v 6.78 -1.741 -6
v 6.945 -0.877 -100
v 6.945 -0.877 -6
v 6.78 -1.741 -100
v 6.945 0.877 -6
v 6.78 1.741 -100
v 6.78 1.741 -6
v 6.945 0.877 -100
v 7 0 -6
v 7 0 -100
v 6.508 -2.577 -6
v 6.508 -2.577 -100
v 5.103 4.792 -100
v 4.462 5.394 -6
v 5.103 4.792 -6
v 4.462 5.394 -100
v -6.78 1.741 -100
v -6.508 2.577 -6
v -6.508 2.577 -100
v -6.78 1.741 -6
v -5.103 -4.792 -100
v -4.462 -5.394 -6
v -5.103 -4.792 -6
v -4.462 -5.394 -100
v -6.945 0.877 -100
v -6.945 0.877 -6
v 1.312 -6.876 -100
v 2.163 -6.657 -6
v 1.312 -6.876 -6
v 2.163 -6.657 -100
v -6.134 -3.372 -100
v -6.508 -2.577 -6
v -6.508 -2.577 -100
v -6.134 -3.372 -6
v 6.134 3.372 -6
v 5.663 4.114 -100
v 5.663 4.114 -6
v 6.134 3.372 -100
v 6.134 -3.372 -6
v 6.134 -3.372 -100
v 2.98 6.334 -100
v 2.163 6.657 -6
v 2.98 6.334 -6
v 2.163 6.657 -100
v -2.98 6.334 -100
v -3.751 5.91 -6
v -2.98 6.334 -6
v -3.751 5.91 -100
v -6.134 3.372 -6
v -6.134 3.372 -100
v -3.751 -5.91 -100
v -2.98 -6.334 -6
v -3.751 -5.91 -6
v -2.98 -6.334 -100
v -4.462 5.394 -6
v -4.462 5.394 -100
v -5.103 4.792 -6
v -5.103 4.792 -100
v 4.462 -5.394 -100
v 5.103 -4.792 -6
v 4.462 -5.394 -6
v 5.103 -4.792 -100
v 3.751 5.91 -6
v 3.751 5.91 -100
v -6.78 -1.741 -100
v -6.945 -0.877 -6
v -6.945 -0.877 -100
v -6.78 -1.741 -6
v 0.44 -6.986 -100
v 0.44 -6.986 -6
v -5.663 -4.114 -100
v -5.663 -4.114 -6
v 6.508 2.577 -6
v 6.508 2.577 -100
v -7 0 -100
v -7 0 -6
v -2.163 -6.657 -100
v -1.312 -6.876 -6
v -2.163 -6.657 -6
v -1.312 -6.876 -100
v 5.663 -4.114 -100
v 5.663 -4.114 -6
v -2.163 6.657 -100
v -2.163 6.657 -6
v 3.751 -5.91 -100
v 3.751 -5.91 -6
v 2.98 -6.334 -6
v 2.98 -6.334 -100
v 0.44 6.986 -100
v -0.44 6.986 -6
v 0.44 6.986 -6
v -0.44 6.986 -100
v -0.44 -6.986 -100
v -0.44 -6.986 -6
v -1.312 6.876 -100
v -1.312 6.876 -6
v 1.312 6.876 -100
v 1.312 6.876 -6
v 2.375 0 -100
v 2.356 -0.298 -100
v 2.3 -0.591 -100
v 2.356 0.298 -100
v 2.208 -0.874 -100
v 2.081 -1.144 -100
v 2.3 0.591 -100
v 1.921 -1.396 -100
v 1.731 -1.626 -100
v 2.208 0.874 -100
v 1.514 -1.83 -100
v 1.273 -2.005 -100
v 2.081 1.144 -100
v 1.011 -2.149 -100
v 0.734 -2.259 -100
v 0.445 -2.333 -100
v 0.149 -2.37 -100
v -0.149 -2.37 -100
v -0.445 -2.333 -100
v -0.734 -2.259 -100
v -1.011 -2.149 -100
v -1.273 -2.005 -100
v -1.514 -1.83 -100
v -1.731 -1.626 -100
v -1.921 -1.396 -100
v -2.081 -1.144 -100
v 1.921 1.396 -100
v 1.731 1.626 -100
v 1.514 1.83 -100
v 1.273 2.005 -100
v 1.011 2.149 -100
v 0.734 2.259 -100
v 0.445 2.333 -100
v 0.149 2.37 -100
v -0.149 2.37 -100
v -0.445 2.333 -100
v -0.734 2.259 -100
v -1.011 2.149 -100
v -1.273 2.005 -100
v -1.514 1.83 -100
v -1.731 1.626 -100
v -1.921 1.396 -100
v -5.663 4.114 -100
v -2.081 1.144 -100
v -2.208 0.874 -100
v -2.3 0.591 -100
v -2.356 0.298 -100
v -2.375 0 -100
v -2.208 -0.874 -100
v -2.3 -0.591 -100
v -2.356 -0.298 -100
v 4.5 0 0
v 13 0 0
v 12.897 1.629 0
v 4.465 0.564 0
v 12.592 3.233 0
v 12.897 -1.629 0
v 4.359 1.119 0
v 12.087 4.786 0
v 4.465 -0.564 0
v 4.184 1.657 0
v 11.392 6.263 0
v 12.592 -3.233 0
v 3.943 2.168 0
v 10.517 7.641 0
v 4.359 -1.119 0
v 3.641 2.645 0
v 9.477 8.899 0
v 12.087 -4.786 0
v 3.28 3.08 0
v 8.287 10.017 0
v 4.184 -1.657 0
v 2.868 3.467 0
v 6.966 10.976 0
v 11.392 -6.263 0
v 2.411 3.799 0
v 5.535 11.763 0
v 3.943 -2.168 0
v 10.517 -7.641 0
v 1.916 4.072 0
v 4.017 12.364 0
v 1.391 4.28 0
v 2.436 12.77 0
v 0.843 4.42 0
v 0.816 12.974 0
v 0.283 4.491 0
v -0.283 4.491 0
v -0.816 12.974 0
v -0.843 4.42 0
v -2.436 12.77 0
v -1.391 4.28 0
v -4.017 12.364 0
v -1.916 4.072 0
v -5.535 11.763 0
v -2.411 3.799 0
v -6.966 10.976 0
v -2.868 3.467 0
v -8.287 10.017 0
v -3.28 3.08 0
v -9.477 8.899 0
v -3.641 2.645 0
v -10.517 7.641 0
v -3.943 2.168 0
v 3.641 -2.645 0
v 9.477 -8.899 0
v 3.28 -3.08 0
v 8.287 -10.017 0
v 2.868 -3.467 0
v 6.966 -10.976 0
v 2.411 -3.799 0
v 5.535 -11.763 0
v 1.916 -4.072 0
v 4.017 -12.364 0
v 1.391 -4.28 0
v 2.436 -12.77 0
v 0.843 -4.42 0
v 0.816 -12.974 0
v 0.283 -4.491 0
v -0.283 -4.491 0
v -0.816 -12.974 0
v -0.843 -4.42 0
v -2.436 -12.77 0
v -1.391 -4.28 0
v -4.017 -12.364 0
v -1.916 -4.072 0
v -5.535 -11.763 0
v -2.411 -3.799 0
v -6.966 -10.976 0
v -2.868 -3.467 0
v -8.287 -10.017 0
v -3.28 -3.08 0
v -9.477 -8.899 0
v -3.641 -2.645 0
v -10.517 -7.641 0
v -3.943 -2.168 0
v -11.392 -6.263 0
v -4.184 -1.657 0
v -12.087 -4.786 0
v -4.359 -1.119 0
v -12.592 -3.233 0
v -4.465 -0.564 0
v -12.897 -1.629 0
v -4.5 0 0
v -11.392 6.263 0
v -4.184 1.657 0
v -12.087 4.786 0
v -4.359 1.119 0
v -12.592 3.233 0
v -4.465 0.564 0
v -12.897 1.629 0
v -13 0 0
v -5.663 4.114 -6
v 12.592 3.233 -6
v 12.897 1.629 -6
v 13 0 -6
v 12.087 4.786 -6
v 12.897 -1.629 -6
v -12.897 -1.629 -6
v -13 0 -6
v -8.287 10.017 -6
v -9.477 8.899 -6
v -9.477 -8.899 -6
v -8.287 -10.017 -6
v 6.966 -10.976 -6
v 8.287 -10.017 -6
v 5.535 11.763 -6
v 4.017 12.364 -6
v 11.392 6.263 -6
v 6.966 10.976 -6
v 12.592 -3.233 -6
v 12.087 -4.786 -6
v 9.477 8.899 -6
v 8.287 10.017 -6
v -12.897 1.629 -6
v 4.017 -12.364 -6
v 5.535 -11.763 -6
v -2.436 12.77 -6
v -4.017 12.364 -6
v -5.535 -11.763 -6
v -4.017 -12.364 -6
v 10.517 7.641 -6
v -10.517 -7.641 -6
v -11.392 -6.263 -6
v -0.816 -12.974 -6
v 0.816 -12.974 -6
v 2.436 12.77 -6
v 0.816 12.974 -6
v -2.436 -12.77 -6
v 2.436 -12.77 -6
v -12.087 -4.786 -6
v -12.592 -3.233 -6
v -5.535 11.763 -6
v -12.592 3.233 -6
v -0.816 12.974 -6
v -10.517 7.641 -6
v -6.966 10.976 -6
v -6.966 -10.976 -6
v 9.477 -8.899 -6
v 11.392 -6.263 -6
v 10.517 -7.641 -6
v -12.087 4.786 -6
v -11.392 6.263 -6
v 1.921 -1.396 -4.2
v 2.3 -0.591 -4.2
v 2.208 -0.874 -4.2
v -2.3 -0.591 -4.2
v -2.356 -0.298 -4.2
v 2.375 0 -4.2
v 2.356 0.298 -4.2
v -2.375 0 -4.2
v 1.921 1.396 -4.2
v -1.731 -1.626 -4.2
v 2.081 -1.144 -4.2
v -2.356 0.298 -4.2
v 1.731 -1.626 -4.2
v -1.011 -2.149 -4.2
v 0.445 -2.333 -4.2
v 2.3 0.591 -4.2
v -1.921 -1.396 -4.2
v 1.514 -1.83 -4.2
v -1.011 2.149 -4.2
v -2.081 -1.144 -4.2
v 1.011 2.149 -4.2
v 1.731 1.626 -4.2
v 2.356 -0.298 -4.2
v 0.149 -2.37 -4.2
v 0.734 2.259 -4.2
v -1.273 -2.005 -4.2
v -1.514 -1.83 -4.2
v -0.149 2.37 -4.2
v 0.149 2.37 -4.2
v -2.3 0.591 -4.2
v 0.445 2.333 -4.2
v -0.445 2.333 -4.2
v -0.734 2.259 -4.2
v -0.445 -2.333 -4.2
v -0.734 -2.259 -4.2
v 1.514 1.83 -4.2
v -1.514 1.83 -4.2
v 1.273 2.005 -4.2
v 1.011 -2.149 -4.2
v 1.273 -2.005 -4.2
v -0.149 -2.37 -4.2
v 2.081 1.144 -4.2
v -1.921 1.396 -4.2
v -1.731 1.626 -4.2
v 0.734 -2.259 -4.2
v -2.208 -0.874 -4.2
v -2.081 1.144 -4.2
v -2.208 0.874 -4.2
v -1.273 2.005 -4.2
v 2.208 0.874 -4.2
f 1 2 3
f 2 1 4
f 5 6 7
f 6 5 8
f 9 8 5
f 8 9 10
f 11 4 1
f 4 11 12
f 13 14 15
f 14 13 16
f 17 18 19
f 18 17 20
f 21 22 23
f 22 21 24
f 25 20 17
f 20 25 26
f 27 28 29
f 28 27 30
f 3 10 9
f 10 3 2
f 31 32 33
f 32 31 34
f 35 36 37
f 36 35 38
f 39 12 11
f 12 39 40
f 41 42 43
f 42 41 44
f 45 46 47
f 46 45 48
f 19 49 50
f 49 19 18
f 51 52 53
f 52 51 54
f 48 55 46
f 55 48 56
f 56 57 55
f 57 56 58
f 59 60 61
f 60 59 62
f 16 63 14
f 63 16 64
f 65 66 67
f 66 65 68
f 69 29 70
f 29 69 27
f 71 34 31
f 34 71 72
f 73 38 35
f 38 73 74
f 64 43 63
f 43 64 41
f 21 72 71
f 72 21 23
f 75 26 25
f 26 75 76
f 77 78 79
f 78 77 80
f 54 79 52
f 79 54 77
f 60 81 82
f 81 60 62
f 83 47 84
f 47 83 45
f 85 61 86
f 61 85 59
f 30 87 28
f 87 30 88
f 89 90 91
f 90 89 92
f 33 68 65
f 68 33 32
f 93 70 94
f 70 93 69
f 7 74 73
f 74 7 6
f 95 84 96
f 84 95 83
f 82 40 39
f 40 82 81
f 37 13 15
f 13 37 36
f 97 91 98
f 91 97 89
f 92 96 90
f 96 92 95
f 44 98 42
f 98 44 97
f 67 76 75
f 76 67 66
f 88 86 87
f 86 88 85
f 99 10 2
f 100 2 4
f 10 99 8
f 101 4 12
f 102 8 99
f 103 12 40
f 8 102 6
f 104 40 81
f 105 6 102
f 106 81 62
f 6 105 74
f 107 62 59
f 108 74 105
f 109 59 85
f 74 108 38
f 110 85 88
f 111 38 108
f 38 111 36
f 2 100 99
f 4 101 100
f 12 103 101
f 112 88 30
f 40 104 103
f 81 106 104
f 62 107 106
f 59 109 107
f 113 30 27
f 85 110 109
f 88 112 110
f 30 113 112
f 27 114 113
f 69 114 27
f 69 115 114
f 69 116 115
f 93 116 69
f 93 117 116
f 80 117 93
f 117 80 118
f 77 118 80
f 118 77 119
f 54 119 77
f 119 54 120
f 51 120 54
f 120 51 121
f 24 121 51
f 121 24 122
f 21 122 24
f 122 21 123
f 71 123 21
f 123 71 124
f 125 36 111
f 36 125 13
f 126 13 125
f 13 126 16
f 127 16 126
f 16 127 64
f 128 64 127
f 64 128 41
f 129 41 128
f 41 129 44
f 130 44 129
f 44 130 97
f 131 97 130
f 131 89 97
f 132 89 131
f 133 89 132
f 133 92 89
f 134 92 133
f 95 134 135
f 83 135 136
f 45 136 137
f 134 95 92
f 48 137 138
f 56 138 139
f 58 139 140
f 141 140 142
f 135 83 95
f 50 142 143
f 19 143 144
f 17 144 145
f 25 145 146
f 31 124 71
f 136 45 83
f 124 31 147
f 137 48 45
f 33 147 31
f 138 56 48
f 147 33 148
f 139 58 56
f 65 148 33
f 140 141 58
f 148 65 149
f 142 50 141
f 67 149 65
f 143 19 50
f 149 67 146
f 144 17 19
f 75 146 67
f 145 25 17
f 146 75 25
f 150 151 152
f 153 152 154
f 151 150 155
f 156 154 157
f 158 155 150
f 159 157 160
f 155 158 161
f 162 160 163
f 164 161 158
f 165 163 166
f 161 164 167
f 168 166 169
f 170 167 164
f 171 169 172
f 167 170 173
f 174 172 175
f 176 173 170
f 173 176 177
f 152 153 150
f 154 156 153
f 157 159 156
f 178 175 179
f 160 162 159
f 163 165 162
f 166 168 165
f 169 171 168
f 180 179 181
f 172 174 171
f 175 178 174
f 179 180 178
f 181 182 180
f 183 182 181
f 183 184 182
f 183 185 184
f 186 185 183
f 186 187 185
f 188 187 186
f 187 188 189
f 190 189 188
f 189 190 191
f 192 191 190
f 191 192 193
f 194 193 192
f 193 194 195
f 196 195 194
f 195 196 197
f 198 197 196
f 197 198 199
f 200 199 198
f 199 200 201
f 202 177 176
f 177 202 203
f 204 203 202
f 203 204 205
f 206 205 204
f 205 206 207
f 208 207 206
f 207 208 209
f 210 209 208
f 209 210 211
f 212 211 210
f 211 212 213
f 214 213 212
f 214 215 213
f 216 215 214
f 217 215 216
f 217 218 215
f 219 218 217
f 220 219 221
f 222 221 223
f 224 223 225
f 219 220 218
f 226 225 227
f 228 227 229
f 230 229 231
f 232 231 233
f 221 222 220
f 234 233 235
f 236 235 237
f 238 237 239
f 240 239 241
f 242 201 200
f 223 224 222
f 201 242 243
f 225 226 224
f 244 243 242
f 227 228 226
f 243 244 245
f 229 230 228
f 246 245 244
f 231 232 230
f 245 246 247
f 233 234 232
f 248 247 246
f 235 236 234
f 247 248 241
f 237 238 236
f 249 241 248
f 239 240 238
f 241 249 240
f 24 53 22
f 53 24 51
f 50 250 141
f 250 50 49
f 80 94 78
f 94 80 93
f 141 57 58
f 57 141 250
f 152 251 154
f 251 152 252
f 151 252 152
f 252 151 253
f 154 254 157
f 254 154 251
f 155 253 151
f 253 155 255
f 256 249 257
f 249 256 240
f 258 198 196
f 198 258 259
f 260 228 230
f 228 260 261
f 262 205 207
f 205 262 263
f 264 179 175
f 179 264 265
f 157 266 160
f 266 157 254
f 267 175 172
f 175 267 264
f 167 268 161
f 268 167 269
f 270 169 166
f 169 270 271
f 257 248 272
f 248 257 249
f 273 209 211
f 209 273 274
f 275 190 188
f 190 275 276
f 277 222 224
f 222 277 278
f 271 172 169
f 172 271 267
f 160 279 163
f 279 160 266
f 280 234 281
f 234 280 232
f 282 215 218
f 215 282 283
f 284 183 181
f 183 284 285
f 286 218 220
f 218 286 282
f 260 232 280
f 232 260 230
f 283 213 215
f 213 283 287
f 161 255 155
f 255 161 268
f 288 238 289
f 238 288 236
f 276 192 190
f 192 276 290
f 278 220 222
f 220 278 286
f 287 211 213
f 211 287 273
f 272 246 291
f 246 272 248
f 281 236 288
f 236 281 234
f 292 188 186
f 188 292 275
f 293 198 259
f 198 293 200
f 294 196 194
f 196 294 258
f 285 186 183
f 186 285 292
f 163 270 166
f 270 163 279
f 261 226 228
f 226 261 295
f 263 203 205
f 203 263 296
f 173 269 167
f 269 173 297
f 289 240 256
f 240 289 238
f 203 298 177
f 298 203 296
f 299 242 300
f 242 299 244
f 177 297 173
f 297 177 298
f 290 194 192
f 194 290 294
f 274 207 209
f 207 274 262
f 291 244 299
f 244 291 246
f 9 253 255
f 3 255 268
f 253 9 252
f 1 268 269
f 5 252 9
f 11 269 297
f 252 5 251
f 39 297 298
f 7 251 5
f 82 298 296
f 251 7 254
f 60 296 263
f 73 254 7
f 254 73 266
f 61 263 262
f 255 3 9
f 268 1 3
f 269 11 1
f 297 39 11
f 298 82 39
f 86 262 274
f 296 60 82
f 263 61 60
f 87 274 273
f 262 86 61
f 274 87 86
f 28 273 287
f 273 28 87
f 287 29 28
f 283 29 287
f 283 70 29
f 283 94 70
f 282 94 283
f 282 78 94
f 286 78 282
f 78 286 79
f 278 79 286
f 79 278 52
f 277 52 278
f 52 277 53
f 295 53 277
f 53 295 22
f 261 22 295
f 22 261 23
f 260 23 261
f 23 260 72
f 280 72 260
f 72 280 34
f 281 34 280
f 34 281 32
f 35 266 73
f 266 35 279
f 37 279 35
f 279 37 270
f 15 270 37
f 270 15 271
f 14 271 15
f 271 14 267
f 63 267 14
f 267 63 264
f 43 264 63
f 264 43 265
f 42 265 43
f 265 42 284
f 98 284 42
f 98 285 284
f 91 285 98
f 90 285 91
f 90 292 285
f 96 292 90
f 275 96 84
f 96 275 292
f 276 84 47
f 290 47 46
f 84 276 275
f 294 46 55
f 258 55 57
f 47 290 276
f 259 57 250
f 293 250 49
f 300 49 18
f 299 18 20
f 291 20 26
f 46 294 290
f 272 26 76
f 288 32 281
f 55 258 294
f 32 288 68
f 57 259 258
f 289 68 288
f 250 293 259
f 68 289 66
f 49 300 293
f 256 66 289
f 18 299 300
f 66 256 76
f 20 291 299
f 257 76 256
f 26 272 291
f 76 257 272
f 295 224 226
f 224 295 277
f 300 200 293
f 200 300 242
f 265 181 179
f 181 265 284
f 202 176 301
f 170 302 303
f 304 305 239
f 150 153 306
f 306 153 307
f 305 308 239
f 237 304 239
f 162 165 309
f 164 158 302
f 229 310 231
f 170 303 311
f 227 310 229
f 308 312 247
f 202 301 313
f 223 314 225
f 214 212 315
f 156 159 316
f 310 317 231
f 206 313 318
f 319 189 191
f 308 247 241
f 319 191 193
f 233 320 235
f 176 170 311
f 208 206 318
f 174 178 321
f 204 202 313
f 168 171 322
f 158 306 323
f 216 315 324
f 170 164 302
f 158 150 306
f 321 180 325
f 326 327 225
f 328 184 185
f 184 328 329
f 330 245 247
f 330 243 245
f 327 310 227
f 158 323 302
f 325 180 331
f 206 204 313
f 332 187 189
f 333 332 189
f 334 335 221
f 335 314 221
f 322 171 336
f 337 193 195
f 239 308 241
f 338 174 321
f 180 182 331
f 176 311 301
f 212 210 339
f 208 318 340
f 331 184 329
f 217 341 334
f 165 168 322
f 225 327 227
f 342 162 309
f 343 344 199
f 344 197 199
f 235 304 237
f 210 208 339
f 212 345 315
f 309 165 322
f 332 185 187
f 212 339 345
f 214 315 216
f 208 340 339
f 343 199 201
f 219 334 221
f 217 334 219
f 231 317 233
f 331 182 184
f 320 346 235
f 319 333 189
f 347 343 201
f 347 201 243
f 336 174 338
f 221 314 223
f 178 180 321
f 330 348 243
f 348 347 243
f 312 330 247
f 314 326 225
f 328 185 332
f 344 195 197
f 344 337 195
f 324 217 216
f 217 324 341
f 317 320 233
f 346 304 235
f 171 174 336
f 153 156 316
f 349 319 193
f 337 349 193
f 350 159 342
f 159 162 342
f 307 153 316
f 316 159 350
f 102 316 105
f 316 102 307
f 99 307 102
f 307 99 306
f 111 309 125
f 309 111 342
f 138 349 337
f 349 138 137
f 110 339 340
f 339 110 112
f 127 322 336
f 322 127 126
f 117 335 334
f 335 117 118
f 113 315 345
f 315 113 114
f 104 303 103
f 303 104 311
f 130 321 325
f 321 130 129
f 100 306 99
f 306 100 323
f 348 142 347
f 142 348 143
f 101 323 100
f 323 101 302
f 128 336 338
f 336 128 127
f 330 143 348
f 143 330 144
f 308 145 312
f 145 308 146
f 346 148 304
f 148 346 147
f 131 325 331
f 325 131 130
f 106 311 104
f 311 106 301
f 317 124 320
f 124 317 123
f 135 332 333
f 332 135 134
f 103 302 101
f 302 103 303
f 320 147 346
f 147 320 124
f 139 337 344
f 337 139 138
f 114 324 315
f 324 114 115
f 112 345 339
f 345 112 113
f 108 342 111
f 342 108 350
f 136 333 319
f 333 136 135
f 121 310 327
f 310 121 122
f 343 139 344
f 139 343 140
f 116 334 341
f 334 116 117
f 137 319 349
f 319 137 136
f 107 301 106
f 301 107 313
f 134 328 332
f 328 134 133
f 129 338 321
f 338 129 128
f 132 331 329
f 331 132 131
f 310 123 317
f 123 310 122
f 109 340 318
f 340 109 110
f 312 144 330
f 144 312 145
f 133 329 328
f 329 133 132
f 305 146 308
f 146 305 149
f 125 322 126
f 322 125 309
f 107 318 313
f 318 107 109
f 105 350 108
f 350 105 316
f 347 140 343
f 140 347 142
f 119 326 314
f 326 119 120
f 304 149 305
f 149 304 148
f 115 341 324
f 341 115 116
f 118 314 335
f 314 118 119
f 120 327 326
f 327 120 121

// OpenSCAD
$fn = 50;


difference() {
	union() {
		translate(v = [0, 0, -100.0000000000]) {
			cylinder(h = 100, r = 7.0000000000);
		}
		translate(v = [0, 0, -6.0000000000]) {
			cylinder(h = 6, r = 13.0000000000);
		}
	}
	union() {
		translate(v = [0, 0, 0]) {
			rotate(a = [0, 0, 0]) {
				difference() {
					union() {
						#translate(v = [0, 0, -100.0000000000]) {
							cylinder(h = 100, r = 2.2500000000);
						}
						#translate(v = [0, 0, -4.2000000000]) {
							cylinder(h = 4.2000000000, r1 = 2.3750000000, r2 = 4.5000000000);
						}
						#translate(v = [0, 0, -100.0000000000]) {
							cylinder(h = 100, r = 2.3750000000);
						}
						#translate(v = [0, 0, -100.0000000000]) {
							cylinder(h = 100, r = 2.2500000000);
						}
					}
					union();
				}
			}
		}
	}
}
